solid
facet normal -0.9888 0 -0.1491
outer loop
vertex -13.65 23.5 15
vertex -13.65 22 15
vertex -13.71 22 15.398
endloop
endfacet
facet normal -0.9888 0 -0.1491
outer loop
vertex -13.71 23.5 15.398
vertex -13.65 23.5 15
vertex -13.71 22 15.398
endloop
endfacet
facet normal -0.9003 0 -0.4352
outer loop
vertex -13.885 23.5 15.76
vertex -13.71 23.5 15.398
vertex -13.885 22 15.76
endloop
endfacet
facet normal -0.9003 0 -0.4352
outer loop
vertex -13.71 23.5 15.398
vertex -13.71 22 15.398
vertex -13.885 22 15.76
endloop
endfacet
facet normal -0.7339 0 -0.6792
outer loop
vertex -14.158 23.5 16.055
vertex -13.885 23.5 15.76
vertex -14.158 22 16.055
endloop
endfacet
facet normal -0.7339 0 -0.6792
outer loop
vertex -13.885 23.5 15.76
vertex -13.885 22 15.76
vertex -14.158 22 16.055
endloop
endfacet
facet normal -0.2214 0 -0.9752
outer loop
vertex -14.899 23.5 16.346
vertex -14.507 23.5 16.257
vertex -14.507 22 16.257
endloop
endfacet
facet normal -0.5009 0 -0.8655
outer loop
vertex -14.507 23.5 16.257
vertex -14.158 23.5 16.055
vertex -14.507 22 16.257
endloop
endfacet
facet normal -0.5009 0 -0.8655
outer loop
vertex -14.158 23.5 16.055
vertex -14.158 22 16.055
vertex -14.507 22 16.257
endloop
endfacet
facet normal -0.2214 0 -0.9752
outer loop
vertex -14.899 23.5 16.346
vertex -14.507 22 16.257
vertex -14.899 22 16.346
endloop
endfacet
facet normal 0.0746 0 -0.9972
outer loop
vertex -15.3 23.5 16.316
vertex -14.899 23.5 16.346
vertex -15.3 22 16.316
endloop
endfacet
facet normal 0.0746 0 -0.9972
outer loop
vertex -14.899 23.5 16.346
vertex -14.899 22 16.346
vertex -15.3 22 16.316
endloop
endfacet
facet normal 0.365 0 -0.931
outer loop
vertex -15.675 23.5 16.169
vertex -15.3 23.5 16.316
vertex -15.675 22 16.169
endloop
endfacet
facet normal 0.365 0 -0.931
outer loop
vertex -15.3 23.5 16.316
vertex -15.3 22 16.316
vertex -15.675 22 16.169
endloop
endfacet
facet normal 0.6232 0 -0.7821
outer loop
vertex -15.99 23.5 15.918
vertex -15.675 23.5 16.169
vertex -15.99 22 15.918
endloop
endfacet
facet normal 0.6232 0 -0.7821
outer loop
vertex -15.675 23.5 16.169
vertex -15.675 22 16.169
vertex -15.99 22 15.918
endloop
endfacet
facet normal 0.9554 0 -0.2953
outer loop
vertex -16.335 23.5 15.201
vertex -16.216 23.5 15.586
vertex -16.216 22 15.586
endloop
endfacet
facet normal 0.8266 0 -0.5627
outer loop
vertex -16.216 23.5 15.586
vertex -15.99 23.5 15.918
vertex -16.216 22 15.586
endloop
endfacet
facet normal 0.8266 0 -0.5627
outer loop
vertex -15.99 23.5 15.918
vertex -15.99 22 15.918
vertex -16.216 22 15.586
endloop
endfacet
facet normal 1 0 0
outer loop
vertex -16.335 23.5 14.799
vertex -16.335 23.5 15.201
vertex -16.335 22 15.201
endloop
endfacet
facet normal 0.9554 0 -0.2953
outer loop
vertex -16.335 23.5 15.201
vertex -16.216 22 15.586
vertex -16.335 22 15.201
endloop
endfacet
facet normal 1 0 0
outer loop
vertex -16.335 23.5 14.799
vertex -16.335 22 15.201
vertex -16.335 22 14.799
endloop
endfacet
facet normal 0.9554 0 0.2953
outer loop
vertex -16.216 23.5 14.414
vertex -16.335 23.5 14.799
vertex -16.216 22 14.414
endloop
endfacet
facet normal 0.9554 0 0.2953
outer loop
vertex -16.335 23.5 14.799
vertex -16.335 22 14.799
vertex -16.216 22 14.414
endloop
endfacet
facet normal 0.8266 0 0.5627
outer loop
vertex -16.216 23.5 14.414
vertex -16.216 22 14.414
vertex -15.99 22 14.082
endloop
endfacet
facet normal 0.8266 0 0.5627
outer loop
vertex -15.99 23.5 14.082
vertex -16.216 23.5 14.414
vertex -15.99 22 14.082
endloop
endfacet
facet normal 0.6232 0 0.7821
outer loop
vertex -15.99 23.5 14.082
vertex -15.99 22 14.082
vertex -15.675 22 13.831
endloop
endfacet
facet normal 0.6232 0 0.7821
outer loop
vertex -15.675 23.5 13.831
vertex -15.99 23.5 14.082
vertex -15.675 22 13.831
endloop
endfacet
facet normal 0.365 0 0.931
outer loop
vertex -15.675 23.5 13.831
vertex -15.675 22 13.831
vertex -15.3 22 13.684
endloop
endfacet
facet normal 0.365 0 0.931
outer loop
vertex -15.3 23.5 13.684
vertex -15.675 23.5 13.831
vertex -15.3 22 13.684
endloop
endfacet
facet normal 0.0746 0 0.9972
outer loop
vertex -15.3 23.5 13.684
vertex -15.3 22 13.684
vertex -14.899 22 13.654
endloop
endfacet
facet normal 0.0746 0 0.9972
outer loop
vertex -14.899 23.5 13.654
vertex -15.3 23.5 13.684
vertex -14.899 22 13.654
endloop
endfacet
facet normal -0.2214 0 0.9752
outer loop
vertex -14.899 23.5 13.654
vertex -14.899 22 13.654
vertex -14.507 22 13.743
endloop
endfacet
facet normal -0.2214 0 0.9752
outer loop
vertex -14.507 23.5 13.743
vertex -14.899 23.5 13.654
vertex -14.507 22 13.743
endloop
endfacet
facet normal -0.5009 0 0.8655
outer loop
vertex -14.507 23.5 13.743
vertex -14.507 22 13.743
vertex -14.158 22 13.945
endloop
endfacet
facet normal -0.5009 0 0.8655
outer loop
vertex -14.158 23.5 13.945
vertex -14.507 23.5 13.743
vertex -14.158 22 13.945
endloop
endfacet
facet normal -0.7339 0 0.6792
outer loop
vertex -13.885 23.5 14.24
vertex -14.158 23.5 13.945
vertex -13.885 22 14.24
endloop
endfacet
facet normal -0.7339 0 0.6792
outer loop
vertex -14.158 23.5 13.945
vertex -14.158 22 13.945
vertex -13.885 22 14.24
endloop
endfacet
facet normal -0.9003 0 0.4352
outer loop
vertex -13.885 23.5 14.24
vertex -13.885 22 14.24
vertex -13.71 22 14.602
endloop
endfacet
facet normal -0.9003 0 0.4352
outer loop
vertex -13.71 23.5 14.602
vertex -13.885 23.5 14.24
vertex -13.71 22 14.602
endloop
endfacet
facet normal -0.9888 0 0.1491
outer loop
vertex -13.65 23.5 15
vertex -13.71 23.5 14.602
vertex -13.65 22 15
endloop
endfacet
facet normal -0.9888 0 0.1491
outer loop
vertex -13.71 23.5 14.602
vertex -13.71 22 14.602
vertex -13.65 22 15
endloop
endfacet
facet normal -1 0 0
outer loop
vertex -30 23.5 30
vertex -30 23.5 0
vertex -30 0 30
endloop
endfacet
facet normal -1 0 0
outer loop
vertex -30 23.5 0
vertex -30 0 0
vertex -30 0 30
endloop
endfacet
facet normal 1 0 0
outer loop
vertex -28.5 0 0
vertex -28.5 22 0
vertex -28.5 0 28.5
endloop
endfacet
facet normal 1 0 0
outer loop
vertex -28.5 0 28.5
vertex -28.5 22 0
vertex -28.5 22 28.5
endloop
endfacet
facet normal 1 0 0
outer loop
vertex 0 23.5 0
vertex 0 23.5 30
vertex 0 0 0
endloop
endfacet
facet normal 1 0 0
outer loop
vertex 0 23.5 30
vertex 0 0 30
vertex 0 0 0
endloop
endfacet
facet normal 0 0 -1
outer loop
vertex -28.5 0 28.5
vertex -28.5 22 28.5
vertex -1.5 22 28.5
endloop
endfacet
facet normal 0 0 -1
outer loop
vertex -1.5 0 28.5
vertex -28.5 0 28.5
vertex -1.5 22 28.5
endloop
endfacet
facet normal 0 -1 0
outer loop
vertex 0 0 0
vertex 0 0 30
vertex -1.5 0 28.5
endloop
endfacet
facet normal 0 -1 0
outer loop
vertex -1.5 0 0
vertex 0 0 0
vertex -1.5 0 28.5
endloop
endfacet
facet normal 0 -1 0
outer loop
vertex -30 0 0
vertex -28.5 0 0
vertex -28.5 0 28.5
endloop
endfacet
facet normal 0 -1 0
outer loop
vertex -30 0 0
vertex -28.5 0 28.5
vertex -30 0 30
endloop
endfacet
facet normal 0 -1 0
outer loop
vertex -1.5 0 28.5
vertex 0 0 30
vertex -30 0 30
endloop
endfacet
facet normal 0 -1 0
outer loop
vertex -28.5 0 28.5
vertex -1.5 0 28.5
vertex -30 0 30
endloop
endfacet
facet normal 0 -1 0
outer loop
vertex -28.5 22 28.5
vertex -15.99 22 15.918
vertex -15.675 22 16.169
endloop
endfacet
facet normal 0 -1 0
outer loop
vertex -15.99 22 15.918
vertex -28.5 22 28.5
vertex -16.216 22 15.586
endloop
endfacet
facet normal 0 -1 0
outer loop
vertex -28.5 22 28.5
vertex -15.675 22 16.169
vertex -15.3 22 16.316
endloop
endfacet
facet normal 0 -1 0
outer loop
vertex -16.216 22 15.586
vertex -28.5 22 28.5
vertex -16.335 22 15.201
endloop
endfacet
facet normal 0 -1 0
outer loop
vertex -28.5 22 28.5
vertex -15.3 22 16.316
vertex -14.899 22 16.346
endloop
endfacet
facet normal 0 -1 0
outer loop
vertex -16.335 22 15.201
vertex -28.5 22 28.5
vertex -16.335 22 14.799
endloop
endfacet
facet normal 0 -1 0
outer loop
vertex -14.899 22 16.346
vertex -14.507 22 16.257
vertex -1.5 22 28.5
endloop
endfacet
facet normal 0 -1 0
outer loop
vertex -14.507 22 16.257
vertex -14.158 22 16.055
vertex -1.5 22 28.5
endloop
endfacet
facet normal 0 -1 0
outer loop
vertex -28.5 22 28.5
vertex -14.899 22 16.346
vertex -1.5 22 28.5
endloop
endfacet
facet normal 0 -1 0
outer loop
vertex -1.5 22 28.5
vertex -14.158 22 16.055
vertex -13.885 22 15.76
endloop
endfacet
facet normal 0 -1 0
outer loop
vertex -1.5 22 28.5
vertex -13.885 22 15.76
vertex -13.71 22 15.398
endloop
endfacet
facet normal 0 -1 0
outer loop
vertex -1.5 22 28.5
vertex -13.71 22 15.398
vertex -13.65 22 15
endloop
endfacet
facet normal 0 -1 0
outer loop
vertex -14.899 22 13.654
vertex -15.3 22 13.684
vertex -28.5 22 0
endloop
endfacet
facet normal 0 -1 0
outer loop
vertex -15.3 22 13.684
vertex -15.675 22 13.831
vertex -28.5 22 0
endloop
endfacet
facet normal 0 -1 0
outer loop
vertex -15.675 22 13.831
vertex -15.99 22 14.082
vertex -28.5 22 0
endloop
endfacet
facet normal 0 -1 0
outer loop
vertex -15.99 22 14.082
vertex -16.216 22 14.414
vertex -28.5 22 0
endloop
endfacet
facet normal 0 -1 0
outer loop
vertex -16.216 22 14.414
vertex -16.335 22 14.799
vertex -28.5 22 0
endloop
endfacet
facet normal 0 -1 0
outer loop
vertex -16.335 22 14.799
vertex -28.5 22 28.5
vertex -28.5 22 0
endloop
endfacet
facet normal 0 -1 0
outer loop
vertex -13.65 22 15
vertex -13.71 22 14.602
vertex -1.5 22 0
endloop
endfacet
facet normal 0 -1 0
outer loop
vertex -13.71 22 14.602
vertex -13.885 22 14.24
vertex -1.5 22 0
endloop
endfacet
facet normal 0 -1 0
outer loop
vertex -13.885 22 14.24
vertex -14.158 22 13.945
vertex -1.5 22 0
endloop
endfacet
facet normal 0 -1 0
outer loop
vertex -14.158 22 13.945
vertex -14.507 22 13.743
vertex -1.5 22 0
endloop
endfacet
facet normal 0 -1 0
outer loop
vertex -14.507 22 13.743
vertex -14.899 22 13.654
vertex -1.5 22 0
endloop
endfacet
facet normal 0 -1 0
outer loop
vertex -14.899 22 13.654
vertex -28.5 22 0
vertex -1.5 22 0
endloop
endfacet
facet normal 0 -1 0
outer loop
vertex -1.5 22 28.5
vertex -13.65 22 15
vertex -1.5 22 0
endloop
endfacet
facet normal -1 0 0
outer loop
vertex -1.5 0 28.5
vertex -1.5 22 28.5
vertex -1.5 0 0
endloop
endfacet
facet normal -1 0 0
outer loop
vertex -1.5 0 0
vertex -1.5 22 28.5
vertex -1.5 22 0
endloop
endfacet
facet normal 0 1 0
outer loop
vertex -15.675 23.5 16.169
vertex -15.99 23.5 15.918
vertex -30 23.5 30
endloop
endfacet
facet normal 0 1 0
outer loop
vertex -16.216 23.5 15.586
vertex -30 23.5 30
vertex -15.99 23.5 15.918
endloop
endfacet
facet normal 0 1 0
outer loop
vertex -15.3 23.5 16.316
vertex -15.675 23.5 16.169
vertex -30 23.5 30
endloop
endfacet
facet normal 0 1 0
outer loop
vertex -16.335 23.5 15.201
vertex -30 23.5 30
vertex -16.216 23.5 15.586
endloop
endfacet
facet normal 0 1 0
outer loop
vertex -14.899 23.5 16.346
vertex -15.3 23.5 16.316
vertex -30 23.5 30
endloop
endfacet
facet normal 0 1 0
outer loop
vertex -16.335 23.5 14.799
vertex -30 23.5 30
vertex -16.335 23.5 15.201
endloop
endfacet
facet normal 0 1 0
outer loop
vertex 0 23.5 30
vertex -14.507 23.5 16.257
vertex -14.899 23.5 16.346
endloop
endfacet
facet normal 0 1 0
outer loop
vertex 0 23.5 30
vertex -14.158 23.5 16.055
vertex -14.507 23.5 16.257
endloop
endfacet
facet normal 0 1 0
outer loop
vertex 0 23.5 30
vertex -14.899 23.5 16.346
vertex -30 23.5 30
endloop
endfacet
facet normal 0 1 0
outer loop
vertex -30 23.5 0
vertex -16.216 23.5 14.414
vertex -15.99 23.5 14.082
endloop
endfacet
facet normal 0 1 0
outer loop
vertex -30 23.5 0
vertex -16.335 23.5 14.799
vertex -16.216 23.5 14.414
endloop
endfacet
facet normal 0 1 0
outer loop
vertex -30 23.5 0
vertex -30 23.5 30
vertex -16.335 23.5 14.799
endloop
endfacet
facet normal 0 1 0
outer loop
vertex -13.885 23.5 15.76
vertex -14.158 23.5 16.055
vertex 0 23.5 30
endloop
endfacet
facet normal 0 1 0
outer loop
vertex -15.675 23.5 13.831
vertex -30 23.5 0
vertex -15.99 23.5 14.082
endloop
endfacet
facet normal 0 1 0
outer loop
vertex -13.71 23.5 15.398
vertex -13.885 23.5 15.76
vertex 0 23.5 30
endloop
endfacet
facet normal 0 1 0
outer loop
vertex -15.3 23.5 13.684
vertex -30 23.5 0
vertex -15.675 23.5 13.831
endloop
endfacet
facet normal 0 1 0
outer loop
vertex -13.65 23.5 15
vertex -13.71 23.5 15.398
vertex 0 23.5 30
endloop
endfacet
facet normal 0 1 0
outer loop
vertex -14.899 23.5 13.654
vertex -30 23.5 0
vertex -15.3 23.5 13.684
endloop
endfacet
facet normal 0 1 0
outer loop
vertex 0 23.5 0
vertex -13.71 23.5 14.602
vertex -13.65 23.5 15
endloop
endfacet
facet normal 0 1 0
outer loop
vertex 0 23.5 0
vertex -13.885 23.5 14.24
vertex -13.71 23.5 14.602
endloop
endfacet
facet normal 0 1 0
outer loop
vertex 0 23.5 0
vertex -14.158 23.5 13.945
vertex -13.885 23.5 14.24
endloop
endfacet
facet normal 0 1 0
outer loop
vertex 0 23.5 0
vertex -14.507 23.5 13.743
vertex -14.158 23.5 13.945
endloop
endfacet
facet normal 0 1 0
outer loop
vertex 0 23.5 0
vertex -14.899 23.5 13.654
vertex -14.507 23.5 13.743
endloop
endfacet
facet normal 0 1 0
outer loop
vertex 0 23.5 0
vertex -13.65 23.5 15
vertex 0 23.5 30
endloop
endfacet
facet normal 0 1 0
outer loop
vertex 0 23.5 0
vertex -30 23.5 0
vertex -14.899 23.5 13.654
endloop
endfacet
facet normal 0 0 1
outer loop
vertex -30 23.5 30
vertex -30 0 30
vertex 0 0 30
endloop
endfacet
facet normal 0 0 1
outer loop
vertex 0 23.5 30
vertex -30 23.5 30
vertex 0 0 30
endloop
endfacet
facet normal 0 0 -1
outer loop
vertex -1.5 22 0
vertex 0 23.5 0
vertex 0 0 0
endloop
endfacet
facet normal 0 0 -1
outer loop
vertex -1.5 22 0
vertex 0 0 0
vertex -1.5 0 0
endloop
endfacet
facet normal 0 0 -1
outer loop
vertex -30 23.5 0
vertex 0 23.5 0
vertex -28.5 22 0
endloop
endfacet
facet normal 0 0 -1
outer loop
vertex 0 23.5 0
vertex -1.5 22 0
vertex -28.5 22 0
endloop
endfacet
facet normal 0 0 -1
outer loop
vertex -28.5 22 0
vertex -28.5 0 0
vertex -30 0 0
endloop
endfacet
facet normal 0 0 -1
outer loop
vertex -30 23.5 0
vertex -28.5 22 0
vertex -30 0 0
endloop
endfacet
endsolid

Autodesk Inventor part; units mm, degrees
ref_plane "YZ Plane" through (0, 0, 0) normal (1, 0, 0) x (0, 1, 0)
ref_plane "XZ Plane" through (0, 0, 0) normal (0, 1, 0) x (-1, 0, 0)
ref_plane "XY Plane" through (0, 0, 0) normal (0, 0, 1) x (1, 0, 0)
sketch "Skizze1" plane through (0, 0, 0) normal (0, 1, 0) x (-1, 0, 0)
  line L0 (0, 0) -> (30, 0)
  line L1 (30, 0) -> (30, 30)
  line L2 (30, 30) -> (0, 30)
  line L3 (0, 30) -> (0, 0)
  circle A0 centre (15, 15) radius 14.1
  dimension "d7" = 28.2
  dimension "d20" = 30
  dimension "d21" = 30
extrude "Extrusion1" add sketch "Skizze1" along normal blind 22 contours L3 L2 L1 L0 | A0
sketch "Skizze2" plane through (0, 22, 0) normal (0, 1, 0) x (1, 0, 0)
  line L0 (0, 0) -> (-30, 0) projected
  line L1 (-1.5, 0) -> (-28.5, 0)
  line L2 (-28.5, 0) -> (-28.5, -28.5)
  line L3 (-28.5, -28.5) -> (-1.5, -28.5)
  line L4 (-1.5, -28.5) -> (-1.5, 0)
  line L5 (-30, 0) -> (-30, -30) projected
  line L6 (0, -30) -> (0, 0) projected
  line L7 (-30, -30) -> (0, -30) projected
  dimension "d8" = 1.5
  dimension "d9" = 1.5
  dimension "d10" = 1.5
extrude "Extrusion2" cut sketch "Skizze2" against normal blind 22 contours L4 L3 L2 L0
sketch "Skizze5" plane through (0, 22, 0) normal (0, 1, 0) x (1, 0, 0)
  line L0 (-30, 0) -> (-30, -30) projected
  line L1 (0, 0) -> (-30, 0)
  line L2 (-30, 0) -> (-30, -30)
  line L3 (-30, -30) -> (0, -30)
  line L4 (0, -30) -> (0, 0)
  line L5 (-31.5556, 0) -> (-1.5, 0) construction
  circle A0 centre (-15, -15) radius 1.35
  line L6 (-1.5, -28.5) -> (-28.5, -28.5) projected
  line L7 (-1.5, 0) -> (-1.5, -28.5)
  line L8 (-28.5, -28.5) -> (-28.5, 0) projected
  line L9 (-1.5, -28.5) -> (-28.5, -28.5)
  dimension "d17" = 2.7
extrude "Extrusion4" add sketch "Skizze5" along normal blind 1.5
equation "\"Biegeradius\" = Stärke"
equation "\"BreiteBiegungsfreistellung\" = Stärke"
equation "\"TiefeBiegungsfreistellung\" = 0.5 * Stärke"
equation "\"GrößeEckenfreistellung\" = 4 * Stärke"
equation "\"MinimalRest\" = 2 * Stärke"
equation "\"Übergangsradius\" = Biegeradius"
equation "\"JacobiRadiusGröße\" = Biegeradius"
equation "\"Abstandsgröße\" = Stärke"
equation "\"Stärke\" = 0.5"
properties part number "Gehäuse Motor"
